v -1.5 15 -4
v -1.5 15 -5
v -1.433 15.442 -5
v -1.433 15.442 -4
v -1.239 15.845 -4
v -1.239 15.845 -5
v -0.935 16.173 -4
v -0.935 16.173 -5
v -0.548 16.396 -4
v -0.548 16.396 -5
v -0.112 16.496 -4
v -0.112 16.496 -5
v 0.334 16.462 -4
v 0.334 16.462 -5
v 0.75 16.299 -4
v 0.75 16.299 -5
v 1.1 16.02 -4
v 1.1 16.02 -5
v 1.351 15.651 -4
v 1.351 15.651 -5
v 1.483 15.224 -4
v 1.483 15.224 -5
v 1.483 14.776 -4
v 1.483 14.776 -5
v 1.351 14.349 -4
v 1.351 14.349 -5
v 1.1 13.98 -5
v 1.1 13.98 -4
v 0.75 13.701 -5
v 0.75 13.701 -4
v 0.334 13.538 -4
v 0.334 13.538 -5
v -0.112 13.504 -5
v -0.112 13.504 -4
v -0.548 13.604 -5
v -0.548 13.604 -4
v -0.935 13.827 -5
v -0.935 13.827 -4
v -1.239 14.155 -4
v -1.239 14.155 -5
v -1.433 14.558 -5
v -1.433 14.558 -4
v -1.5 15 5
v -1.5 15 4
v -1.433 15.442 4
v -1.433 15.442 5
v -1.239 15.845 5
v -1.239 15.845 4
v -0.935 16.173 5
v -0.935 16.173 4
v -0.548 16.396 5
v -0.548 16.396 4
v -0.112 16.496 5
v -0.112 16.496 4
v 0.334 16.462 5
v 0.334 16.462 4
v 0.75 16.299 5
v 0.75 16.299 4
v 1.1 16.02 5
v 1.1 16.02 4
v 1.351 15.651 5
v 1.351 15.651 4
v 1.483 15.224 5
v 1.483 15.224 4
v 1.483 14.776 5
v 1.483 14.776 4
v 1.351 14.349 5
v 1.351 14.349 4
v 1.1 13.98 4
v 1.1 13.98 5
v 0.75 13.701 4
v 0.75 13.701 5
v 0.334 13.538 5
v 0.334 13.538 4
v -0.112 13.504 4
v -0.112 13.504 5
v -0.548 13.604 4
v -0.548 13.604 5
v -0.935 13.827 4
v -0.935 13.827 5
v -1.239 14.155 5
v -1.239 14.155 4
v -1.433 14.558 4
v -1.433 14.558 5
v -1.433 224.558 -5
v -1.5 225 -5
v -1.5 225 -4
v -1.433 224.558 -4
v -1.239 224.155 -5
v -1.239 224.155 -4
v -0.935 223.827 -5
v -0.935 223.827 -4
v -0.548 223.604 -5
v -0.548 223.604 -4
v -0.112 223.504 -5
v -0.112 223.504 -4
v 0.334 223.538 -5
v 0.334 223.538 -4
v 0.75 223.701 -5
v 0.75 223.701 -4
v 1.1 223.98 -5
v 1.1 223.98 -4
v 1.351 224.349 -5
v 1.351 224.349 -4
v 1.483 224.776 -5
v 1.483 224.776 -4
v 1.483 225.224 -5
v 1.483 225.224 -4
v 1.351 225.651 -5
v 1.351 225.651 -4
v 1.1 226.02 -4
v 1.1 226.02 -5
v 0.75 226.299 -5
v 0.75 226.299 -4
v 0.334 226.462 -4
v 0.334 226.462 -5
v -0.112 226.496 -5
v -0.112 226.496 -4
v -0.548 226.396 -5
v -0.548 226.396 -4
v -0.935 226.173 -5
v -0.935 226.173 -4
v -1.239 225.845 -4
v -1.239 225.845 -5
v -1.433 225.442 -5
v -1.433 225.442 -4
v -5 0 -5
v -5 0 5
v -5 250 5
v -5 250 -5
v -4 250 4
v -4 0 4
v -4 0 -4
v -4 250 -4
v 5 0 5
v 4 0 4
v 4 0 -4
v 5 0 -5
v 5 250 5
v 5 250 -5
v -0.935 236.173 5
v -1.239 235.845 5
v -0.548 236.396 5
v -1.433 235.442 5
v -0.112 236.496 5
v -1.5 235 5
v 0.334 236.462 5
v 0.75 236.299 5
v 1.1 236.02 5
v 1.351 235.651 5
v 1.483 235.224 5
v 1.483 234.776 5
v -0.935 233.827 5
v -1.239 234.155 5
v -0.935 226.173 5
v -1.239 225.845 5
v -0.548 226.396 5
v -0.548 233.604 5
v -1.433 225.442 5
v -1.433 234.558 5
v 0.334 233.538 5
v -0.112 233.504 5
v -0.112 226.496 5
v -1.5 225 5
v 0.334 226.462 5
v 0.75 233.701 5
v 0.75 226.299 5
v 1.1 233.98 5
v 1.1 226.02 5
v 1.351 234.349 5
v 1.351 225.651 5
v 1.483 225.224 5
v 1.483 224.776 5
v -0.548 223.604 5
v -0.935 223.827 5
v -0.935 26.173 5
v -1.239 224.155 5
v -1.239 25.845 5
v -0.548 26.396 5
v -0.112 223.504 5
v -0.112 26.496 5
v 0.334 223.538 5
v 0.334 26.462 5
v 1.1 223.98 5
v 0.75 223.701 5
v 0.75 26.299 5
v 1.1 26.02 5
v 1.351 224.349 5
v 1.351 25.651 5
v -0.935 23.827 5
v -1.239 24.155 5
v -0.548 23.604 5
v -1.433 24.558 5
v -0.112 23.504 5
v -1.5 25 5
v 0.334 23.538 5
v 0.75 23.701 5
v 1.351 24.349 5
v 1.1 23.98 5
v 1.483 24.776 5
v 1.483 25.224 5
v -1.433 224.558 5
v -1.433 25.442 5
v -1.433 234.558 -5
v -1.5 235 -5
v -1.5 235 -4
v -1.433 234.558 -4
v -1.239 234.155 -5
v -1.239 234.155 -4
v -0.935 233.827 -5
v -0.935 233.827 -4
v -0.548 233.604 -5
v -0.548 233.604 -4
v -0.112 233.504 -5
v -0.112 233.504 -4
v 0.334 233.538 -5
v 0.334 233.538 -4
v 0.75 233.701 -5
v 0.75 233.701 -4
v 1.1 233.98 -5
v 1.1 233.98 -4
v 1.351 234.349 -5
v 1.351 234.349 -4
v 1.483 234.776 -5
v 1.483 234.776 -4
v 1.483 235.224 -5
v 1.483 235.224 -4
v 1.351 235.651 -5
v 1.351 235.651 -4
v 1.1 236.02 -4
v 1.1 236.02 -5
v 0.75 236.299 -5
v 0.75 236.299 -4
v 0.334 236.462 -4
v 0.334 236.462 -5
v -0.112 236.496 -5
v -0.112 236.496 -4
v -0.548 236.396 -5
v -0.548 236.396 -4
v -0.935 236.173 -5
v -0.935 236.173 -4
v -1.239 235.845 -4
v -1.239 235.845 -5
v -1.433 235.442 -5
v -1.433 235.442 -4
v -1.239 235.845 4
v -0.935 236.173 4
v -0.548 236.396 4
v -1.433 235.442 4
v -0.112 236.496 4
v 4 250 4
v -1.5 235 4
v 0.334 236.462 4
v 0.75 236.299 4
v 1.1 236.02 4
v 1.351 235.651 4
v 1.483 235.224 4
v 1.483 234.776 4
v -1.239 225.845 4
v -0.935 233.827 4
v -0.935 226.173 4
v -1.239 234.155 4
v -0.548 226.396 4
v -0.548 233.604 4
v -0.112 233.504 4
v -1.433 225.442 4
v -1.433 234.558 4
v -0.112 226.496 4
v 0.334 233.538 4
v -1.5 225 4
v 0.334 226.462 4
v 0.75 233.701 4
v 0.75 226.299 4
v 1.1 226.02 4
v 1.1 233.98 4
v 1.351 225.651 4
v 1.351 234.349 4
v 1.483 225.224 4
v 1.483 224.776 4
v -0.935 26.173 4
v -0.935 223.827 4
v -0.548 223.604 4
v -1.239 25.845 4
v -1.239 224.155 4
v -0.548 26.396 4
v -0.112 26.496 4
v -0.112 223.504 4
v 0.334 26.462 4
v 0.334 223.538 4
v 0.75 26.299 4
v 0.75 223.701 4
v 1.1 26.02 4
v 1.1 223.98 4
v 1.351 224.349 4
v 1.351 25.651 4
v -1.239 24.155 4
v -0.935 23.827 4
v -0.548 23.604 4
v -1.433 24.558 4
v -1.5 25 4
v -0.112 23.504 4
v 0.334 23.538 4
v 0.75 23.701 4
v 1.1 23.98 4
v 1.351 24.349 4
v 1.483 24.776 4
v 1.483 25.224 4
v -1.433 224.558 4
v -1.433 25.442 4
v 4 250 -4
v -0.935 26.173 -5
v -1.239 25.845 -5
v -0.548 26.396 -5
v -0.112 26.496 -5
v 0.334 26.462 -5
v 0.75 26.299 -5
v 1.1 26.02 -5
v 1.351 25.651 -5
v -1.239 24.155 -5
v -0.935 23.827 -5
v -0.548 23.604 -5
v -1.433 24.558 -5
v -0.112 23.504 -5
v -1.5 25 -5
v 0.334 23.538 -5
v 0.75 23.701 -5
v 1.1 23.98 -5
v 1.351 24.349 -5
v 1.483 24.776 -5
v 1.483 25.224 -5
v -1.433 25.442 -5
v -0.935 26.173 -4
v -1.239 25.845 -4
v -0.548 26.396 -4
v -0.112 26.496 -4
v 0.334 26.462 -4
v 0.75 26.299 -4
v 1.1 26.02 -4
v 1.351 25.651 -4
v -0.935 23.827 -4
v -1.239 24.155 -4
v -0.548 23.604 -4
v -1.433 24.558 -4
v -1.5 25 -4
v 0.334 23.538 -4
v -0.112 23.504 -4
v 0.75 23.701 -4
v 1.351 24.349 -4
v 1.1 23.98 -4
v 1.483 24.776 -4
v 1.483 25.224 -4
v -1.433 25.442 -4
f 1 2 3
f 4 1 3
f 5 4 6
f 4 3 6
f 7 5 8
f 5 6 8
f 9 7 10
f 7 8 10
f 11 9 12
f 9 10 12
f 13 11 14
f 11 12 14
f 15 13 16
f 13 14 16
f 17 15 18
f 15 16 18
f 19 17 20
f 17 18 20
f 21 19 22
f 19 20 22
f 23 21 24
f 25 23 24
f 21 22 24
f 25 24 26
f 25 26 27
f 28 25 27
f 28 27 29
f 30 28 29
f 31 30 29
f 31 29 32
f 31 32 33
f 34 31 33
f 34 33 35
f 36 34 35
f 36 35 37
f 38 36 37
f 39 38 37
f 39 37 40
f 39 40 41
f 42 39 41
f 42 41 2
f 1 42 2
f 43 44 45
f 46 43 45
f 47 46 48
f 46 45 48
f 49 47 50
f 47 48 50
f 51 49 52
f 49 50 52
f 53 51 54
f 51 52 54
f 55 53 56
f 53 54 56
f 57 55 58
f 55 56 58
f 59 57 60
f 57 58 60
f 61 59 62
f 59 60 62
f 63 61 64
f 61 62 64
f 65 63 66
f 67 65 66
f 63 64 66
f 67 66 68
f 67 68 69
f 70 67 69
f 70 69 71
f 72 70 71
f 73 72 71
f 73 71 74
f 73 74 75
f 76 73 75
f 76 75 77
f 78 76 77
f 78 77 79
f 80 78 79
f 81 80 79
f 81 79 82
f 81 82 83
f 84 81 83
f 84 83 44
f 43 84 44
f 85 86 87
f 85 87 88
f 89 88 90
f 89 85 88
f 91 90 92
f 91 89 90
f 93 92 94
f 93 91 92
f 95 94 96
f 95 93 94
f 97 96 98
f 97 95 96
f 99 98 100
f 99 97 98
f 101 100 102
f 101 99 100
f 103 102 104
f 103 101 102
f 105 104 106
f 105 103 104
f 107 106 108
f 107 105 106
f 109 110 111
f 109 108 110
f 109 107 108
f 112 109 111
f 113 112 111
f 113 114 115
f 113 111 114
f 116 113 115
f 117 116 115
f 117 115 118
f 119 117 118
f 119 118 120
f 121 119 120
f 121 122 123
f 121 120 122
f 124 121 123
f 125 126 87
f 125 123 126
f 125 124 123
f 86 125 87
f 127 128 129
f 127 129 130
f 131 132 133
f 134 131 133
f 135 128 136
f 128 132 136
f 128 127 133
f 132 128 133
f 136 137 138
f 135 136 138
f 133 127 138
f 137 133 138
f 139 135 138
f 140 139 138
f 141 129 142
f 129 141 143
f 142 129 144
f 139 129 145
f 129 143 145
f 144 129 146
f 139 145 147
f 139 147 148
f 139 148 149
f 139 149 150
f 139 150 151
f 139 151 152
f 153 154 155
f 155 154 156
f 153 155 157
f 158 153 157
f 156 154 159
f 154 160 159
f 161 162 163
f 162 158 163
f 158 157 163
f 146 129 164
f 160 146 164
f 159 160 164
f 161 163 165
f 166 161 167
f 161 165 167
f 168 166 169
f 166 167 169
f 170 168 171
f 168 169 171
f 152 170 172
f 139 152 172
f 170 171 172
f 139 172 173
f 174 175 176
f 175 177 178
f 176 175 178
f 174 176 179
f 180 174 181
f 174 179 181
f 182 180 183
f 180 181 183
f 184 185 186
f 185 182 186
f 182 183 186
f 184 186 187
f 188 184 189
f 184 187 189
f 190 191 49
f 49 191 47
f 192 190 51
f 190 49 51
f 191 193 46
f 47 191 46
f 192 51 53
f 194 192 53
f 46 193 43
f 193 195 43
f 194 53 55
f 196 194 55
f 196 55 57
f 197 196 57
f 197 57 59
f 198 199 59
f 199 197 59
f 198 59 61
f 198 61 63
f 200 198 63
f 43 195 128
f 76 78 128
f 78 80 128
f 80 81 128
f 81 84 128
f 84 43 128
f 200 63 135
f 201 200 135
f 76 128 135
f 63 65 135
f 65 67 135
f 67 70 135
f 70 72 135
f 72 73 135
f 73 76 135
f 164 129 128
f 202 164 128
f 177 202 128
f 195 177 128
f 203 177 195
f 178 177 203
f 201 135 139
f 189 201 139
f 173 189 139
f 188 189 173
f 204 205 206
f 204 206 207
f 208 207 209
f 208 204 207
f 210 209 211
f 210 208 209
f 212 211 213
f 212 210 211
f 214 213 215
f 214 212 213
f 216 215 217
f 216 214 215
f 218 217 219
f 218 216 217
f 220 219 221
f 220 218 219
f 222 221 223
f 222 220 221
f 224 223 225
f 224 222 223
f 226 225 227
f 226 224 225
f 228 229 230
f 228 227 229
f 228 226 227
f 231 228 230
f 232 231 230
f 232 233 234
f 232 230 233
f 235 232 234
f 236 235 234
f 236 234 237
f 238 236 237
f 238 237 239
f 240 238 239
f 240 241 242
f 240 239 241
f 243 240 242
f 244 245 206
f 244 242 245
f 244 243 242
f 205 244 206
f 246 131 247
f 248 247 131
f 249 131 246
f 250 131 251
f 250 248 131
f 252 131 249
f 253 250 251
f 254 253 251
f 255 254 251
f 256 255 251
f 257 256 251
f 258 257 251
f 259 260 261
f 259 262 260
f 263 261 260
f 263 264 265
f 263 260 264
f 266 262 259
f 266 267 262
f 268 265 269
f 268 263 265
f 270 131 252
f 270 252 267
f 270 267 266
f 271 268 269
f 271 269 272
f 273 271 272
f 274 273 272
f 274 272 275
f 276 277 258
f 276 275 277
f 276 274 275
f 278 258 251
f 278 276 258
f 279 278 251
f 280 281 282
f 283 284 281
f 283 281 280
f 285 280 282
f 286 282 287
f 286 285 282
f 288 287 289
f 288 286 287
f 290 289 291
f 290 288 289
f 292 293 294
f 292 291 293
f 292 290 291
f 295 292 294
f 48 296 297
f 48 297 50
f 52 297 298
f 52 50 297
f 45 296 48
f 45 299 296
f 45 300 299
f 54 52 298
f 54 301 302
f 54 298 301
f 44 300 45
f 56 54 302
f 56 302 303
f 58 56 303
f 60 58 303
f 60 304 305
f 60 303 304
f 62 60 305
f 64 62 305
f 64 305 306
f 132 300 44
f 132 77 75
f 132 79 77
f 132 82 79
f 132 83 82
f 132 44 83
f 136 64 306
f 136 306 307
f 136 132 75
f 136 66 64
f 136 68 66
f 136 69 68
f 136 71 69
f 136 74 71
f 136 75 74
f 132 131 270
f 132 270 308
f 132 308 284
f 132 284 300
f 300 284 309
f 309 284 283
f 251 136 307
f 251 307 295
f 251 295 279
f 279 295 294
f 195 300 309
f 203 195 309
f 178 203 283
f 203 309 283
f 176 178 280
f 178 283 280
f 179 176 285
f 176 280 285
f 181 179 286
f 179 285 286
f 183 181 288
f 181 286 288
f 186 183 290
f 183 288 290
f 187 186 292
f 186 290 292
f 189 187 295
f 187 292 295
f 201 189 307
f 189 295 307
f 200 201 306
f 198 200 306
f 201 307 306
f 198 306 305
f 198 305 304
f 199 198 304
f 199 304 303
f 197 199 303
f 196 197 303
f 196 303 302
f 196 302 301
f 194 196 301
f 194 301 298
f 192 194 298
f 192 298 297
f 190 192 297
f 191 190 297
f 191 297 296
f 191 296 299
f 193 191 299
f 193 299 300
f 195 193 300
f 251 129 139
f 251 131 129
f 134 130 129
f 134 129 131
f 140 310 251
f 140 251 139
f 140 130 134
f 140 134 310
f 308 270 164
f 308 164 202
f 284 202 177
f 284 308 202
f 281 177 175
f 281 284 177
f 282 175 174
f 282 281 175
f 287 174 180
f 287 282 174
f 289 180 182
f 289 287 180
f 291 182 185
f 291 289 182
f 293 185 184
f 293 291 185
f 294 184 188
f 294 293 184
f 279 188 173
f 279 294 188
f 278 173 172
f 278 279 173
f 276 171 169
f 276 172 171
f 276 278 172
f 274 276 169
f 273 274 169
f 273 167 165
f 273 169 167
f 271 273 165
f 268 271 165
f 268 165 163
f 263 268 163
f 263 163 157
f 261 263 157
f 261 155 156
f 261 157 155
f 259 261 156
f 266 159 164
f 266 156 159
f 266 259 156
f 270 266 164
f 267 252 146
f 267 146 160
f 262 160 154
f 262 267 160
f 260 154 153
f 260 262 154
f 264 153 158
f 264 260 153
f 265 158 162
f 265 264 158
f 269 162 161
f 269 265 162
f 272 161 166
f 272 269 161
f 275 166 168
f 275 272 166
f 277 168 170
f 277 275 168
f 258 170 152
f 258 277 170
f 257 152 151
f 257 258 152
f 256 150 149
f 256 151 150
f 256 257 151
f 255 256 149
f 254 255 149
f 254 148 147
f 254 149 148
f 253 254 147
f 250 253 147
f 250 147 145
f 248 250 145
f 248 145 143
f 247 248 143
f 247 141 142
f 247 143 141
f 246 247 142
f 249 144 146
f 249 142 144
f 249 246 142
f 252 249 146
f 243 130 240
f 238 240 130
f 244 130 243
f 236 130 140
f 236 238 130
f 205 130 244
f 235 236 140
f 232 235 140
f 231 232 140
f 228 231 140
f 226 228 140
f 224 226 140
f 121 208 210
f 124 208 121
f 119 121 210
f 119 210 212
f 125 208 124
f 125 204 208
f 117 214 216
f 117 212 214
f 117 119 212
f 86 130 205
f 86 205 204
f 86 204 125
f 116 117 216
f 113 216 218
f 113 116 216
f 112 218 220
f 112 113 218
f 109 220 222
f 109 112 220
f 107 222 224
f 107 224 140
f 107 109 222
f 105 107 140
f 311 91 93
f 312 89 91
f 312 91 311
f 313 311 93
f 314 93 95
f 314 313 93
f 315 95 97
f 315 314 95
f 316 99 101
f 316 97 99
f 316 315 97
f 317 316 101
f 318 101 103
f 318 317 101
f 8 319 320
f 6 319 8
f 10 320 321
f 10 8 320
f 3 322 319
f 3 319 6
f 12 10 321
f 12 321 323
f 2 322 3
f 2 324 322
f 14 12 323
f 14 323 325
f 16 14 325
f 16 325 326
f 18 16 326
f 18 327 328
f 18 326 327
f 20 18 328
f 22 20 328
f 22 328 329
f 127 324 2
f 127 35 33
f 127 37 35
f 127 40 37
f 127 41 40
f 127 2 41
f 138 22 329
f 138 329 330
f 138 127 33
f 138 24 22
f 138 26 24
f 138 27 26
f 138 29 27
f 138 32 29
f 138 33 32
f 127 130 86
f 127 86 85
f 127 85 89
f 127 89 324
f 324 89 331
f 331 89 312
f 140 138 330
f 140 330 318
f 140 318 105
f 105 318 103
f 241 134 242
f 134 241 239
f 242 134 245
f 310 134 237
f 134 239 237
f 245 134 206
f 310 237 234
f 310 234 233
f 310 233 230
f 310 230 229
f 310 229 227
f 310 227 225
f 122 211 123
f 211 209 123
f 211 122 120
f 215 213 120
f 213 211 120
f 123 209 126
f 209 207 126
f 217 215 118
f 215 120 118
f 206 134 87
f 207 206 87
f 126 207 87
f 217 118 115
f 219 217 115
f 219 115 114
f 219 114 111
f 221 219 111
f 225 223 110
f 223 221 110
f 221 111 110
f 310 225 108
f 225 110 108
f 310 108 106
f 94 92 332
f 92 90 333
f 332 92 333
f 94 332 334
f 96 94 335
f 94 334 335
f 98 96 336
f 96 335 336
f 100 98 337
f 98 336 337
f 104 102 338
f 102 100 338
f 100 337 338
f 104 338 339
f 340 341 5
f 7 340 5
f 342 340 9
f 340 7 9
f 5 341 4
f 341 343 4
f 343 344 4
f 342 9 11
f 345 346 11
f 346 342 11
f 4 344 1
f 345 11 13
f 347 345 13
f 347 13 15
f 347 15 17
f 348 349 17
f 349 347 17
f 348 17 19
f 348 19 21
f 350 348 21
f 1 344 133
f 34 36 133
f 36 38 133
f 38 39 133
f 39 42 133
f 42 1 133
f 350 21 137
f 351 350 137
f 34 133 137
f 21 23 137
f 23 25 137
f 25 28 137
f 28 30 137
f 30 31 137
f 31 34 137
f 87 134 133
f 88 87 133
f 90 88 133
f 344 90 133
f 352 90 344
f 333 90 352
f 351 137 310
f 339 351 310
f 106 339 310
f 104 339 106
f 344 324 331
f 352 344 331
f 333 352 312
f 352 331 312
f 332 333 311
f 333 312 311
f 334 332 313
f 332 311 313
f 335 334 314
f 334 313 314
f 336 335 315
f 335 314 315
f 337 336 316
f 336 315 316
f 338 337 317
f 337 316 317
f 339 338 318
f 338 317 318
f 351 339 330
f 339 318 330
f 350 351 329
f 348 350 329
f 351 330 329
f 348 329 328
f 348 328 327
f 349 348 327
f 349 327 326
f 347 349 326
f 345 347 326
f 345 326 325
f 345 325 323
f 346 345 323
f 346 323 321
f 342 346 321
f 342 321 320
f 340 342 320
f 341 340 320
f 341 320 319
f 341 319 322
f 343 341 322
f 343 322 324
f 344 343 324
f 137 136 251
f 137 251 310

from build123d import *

# Parameters (mm, degrees)
SKETCH_1_W            = 10
SKETCH_1_H            = 10
SKETCH_1_W_2          = 8
SKETCH_1_H_2          = 8
EXTRUDE_1_DEPTH       = 250
HOLE_WIZARD_3_0_3_1_D = 3


with BuildPart() as part:
    # 草图1 → 凸台-拉伸1 (new body)
    with BuildSketch(Plane(origin=(0, 0, 0), x_dir=(1, 0, 0), z_dir=(0, 1, 0))):
        Rectangle(SKETCH_1_W, SKETCH_1_H)
        Rectangle(SKETCH_1_W_2, SKETCH_1_H_2, mode=Mode.SUBTRACT)
    extrude(amount=EXTRUDE_1_DEPTH)

    # Ø3.0 (3) 直径孔1 (through all)
    with Locations(Plane.XY.offset(5)):
        with Locations((0, 15), (0, 25)):
            hole_wizard_3_0_3_1 = Hole(HOLE_WIZARD_3_0_3_1_D / 2)

    # 镜向1: Ø3.0 (3) 直径孔1 across plane
    add(hole_wizard_3_0_3_1.mirror(Plane(origin=(0, 125, 0), x_dir=(0, 0, 1), z_dir=(0, -1, 0))), mode=Mode.SUBTRACT)


solid = part.part
